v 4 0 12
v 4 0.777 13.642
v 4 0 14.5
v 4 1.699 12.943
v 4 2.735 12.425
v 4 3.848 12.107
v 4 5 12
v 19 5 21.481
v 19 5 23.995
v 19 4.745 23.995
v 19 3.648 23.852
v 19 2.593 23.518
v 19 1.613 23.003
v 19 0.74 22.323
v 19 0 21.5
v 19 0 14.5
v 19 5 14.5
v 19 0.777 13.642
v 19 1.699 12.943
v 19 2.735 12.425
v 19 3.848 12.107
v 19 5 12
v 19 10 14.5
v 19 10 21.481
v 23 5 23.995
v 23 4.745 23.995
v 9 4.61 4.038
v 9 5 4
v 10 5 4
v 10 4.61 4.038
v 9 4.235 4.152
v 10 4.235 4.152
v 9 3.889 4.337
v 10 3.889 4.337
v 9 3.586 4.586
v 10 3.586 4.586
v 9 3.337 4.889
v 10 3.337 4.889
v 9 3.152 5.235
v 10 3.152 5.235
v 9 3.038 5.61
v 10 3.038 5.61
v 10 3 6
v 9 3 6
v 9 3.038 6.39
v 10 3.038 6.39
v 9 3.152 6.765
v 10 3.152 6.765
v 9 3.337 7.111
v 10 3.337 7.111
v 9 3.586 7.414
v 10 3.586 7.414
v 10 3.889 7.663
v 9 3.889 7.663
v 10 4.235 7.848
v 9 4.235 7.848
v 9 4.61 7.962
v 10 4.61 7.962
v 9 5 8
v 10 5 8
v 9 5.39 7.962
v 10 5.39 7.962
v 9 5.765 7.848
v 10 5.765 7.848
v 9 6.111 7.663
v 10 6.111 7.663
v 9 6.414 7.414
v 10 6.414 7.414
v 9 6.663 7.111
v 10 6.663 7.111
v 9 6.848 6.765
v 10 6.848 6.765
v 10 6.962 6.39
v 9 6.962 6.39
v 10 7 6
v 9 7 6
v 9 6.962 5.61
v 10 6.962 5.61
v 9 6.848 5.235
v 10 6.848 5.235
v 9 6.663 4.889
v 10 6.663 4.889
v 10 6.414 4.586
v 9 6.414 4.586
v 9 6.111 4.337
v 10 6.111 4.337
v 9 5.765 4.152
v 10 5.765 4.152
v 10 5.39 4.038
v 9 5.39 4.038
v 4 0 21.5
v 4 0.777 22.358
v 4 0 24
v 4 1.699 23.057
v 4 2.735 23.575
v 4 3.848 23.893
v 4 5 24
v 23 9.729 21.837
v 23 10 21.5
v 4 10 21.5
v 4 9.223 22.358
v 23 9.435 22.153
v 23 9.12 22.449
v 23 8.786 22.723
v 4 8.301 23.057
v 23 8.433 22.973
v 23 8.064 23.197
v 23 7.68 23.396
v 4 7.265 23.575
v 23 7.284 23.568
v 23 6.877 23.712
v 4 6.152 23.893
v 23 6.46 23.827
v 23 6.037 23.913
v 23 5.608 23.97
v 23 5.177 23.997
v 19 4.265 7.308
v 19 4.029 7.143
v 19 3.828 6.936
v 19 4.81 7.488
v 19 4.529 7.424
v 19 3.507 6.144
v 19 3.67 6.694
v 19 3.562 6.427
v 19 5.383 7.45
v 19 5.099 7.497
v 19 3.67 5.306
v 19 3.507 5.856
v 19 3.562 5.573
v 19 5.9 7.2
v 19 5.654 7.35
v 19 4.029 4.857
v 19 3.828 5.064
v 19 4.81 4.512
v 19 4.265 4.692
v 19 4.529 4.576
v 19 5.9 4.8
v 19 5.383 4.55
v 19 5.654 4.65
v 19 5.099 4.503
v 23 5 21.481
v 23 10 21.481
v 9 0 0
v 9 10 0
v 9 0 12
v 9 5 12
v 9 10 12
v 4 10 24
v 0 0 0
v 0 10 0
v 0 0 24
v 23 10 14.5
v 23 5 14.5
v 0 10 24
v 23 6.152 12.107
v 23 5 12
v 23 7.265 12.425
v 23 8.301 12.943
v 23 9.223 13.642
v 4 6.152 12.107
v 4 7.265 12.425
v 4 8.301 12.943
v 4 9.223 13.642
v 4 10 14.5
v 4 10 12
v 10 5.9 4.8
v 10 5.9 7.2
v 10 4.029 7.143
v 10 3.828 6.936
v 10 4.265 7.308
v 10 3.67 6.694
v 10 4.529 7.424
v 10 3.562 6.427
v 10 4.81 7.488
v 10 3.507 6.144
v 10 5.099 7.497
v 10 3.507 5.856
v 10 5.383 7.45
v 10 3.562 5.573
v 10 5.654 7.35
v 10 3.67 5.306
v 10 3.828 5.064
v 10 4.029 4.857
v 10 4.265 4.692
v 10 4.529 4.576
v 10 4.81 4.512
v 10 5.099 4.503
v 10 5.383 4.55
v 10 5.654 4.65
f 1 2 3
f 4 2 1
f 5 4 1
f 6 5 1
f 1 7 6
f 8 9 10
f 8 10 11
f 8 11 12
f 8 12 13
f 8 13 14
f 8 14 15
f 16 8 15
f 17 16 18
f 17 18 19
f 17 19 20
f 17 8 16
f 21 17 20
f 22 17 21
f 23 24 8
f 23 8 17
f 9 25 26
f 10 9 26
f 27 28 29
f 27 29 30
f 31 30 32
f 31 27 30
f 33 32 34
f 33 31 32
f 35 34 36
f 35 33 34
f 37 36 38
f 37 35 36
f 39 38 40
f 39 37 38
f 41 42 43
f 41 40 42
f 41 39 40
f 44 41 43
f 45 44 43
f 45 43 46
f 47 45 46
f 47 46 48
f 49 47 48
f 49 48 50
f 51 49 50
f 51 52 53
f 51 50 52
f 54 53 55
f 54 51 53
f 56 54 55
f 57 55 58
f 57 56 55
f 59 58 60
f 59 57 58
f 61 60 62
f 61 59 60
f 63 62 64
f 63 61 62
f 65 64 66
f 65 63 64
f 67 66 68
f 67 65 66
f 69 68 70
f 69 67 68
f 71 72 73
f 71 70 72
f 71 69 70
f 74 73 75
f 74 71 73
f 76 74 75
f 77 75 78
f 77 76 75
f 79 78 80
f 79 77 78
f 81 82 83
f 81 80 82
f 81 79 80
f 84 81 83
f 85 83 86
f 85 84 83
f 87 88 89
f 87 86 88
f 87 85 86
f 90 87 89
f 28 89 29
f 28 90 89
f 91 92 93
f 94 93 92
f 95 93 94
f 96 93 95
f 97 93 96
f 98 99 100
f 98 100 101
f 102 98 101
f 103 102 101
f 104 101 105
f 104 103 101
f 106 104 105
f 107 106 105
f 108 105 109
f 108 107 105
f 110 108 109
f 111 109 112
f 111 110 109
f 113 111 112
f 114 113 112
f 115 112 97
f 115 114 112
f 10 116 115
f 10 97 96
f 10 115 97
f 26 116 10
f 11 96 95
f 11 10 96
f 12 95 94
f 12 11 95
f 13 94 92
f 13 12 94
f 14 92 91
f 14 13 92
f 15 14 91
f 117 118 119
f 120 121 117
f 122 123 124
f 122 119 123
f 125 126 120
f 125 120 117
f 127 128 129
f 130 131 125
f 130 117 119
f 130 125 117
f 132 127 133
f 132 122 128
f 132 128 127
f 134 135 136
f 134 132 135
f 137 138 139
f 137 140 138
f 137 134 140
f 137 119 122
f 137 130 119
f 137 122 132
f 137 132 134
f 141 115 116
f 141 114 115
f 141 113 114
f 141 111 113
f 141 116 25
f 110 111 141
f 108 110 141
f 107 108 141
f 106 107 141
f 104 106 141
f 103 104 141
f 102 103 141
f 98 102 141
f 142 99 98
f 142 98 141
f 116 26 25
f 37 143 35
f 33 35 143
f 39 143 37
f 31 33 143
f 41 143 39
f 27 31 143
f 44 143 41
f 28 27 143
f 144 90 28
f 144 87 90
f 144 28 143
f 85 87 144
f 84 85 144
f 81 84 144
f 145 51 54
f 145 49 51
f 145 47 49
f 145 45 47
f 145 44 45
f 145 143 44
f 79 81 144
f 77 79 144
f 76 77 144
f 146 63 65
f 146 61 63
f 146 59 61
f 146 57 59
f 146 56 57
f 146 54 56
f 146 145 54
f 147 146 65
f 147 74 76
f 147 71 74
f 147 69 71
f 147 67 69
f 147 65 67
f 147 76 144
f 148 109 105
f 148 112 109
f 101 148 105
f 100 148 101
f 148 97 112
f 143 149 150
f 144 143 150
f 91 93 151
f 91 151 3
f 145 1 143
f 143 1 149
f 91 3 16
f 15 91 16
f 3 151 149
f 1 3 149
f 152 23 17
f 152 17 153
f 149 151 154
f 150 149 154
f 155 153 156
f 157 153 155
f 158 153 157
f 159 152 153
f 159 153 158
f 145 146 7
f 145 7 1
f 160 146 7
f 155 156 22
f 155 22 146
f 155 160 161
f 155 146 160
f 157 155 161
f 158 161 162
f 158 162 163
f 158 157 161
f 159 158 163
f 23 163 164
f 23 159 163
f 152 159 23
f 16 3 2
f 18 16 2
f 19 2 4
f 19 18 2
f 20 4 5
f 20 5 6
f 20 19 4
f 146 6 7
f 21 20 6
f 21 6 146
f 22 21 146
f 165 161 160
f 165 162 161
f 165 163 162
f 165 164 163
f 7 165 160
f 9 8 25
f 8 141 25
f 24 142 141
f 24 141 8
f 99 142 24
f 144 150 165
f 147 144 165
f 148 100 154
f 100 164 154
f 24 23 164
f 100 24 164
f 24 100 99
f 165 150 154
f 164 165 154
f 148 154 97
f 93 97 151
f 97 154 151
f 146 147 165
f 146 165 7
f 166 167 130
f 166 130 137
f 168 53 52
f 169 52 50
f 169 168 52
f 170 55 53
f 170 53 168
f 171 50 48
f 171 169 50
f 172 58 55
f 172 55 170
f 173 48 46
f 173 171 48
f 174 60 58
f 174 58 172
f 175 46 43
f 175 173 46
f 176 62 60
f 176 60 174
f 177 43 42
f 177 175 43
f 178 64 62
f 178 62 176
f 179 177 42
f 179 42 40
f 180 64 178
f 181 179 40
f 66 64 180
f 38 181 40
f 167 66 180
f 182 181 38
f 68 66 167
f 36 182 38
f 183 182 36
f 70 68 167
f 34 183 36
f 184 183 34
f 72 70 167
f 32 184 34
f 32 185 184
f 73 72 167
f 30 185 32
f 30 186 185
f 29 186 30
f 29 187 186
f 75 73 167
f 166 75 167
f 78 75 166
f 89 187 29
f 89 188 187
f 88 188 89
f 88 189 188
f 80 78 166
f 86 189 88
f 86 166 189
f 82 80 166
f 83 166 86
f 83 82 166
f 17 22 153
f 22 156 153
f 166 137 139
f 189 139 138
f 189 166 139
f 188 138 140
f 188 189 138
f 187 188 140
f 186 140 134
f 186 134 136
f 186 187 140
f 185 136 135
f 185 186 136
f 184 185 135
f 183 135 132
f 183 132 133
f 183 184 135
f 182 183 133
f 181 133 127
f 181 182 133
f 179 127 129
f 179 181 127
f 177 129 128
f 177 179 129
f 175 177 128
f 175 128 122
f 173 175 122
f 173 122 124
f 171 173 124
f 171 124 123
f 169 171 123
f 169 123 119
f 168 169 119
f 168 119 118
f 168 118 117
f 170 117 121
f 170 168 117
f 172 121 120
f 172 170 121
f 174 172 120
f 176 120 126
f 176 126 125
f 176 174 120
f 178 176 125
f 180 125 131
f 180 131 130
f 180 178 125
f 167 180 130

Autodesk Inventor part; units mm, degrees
ref_plane "YZ Plane" through (0, 0, 0) normal (1, 0, 0) x (0, 1, 0)
ref_plane "XZ Plane" through (0, 0, 0) normal (0, 1, 0) x (-1, 0, 0)
ref_plane "XY Plane" through (0, 0, 0) normal (0, 0, 1) x (1, 0, 0)
sketch "Sketch1" plane through (0, 0, 0) normal (1, 0, 0) x (0, 1, 0)
  line L0 (10, 24) -> (0, 24)
  line L1 (0, 24) -> (0, 0)
  line L2 (0, 0) -> (10, 0)
  line L3 (10, 0) -> (10, 24)
  line L4 (10, 24) -> (0, 24)
  line L5 (0, 24) -> (0, 12)
  line L6 (0, 12) -> (10, 12)
  line L7 (10, 12) -> (10, 24)
  dimension "d0" = 24
  dimension "d1" = 10
  dimension "d2" = 12
extrude "Extrusion1" add sketch "Sketch1" along normal blind 19 contours L3 L6 L1 L0
extrude "Extrusion2" add sketch "Sketch1" along normal blind 9 contours L3 L2 L1 L6
sketch "Sketch2" plane through (9, 0, 0) normal (1, 0, 0) x (0, 0, -1)
  circle A0 centre (-6, 5) radius 2
  line L0 (0, 10) -> (-12, 10) projected
  line L1 (0, 0) -> (0, 10) projected
  circle A1 centre (-6, 5) radius 1.5
  line L2 (-7.2, 5.9) -> (-4.8, 5.9)
  dimension "d7" = 4
  dimension "d8" = 5
  dimension "d9" = 6
  dimension "d10" = 3
  dimension "d11" = 2.4
extrude "Extrusion3" add sketch "Sketch2" along normal blind 1
extrude "Extrusion4" add sketch "Sketch2" along normal blind 10 contours A1 L2 picked at (-5.5775, 4.8311)
extrude "Extrusion5" add sketch "Sketch2" along normal blind 1 contours L2 A1 picked at (-5.6796, 5.9839)
sketch "Sketch3" plane through (19, 0, 0) normal (1, 0, 0) x (0, 0, -1)
  line L0 (-24, 10) -> (-24, 0) projected
  line L1 (-24, 10) -> (-12, 10)
  line L2 (-12, 10) -> (-12, 0)
  line L3 (-12, 0) -> (-24, 0)
  line L4 (-24, 0) -> (-24, 10)
  line L5 (-12, 10) -> (-24, 10) projected
  line L6 (-24, 0) -> (-12, 0) projected
  line L7 (-21.5, 10) -> (-14.5, 10)
  line L8 (-14.5, 10) -> (-14.5, 0)
  line L9 (-14.5, 0) -> (-21.5, 0)
  line L10 (-21.5, 0) -> (-21.5, 10)
  arc A0 (-21.5, 10) -> (-21.5, 0) centre (-17.75, 5) ccw
  arc A1 (-14.5, 0) -> (-14.5, 10) centre (-18.25, 5) ccw
  point P0 (0, 0)
  dimension "d18" = 2.5
  dimension "d19" = 2.5
  dimension "d20" = 7
extrude "Extrusion6" cut sketch "Sketch3" against normal blind 15 contours L1 A0 L0 | A0 L3 L0
extrude "Extrusion7" cut sketch "Sketch3" against normal blind 15 contours L1 L2 A1 | A1 L2 L3
extrude "Extrusion8" add sketch "Sketch3" along normal blind 4 contours A0 L10 | L1 L8 L3 L10 | A1 L8
sketch "Sketch4" plane through (23, 0, 0) normal (1, 0, 0) x (0, 0, -1)
  line L0 (-12, 5) -> (-12, 0) projected
  line L1 (-23.9948, 0) -> (-12, 0)
  line L2 (-12, 0) -> (-12, 5)
  line L3 (-12, 5) -> (-23.9948, 5)
  line L4 (-23.9948, 5) -> (-23.9948, 0)
  point P0 (0, 0)
extrude "Extrusion9" cut sketch "Sketch4" against normal blind 4
sketch "Sketch5" plane through (23, 0, 0) normal (1, 0, 0) x (0, 0, -1)
  point P0 (0, 0)
sketch "Sketch6" plane through (0, 10, 0) normal (0, 1, 0) x (1, 0, 0)
  line L0 (23, -23.9948) -> (23, -12) projected
  line L1 (19, -12) -> (19, -14.5) projected
  line L2 (23, -21.4808) -> (19, -21.4808)
  line L3 (19, -21.4808) -> (19, -14.5)
  line L4 (19, -14.5) -> (23, -14.5)
  line L5 (23, -14.5) -> (23, -21.4808)
  point P0 (0, 0)
extrude "Extrusion10" cut sketch "Sketch6" against normal blind 8
equation "\"d19\" = d18"
properties part number "motorcek"
